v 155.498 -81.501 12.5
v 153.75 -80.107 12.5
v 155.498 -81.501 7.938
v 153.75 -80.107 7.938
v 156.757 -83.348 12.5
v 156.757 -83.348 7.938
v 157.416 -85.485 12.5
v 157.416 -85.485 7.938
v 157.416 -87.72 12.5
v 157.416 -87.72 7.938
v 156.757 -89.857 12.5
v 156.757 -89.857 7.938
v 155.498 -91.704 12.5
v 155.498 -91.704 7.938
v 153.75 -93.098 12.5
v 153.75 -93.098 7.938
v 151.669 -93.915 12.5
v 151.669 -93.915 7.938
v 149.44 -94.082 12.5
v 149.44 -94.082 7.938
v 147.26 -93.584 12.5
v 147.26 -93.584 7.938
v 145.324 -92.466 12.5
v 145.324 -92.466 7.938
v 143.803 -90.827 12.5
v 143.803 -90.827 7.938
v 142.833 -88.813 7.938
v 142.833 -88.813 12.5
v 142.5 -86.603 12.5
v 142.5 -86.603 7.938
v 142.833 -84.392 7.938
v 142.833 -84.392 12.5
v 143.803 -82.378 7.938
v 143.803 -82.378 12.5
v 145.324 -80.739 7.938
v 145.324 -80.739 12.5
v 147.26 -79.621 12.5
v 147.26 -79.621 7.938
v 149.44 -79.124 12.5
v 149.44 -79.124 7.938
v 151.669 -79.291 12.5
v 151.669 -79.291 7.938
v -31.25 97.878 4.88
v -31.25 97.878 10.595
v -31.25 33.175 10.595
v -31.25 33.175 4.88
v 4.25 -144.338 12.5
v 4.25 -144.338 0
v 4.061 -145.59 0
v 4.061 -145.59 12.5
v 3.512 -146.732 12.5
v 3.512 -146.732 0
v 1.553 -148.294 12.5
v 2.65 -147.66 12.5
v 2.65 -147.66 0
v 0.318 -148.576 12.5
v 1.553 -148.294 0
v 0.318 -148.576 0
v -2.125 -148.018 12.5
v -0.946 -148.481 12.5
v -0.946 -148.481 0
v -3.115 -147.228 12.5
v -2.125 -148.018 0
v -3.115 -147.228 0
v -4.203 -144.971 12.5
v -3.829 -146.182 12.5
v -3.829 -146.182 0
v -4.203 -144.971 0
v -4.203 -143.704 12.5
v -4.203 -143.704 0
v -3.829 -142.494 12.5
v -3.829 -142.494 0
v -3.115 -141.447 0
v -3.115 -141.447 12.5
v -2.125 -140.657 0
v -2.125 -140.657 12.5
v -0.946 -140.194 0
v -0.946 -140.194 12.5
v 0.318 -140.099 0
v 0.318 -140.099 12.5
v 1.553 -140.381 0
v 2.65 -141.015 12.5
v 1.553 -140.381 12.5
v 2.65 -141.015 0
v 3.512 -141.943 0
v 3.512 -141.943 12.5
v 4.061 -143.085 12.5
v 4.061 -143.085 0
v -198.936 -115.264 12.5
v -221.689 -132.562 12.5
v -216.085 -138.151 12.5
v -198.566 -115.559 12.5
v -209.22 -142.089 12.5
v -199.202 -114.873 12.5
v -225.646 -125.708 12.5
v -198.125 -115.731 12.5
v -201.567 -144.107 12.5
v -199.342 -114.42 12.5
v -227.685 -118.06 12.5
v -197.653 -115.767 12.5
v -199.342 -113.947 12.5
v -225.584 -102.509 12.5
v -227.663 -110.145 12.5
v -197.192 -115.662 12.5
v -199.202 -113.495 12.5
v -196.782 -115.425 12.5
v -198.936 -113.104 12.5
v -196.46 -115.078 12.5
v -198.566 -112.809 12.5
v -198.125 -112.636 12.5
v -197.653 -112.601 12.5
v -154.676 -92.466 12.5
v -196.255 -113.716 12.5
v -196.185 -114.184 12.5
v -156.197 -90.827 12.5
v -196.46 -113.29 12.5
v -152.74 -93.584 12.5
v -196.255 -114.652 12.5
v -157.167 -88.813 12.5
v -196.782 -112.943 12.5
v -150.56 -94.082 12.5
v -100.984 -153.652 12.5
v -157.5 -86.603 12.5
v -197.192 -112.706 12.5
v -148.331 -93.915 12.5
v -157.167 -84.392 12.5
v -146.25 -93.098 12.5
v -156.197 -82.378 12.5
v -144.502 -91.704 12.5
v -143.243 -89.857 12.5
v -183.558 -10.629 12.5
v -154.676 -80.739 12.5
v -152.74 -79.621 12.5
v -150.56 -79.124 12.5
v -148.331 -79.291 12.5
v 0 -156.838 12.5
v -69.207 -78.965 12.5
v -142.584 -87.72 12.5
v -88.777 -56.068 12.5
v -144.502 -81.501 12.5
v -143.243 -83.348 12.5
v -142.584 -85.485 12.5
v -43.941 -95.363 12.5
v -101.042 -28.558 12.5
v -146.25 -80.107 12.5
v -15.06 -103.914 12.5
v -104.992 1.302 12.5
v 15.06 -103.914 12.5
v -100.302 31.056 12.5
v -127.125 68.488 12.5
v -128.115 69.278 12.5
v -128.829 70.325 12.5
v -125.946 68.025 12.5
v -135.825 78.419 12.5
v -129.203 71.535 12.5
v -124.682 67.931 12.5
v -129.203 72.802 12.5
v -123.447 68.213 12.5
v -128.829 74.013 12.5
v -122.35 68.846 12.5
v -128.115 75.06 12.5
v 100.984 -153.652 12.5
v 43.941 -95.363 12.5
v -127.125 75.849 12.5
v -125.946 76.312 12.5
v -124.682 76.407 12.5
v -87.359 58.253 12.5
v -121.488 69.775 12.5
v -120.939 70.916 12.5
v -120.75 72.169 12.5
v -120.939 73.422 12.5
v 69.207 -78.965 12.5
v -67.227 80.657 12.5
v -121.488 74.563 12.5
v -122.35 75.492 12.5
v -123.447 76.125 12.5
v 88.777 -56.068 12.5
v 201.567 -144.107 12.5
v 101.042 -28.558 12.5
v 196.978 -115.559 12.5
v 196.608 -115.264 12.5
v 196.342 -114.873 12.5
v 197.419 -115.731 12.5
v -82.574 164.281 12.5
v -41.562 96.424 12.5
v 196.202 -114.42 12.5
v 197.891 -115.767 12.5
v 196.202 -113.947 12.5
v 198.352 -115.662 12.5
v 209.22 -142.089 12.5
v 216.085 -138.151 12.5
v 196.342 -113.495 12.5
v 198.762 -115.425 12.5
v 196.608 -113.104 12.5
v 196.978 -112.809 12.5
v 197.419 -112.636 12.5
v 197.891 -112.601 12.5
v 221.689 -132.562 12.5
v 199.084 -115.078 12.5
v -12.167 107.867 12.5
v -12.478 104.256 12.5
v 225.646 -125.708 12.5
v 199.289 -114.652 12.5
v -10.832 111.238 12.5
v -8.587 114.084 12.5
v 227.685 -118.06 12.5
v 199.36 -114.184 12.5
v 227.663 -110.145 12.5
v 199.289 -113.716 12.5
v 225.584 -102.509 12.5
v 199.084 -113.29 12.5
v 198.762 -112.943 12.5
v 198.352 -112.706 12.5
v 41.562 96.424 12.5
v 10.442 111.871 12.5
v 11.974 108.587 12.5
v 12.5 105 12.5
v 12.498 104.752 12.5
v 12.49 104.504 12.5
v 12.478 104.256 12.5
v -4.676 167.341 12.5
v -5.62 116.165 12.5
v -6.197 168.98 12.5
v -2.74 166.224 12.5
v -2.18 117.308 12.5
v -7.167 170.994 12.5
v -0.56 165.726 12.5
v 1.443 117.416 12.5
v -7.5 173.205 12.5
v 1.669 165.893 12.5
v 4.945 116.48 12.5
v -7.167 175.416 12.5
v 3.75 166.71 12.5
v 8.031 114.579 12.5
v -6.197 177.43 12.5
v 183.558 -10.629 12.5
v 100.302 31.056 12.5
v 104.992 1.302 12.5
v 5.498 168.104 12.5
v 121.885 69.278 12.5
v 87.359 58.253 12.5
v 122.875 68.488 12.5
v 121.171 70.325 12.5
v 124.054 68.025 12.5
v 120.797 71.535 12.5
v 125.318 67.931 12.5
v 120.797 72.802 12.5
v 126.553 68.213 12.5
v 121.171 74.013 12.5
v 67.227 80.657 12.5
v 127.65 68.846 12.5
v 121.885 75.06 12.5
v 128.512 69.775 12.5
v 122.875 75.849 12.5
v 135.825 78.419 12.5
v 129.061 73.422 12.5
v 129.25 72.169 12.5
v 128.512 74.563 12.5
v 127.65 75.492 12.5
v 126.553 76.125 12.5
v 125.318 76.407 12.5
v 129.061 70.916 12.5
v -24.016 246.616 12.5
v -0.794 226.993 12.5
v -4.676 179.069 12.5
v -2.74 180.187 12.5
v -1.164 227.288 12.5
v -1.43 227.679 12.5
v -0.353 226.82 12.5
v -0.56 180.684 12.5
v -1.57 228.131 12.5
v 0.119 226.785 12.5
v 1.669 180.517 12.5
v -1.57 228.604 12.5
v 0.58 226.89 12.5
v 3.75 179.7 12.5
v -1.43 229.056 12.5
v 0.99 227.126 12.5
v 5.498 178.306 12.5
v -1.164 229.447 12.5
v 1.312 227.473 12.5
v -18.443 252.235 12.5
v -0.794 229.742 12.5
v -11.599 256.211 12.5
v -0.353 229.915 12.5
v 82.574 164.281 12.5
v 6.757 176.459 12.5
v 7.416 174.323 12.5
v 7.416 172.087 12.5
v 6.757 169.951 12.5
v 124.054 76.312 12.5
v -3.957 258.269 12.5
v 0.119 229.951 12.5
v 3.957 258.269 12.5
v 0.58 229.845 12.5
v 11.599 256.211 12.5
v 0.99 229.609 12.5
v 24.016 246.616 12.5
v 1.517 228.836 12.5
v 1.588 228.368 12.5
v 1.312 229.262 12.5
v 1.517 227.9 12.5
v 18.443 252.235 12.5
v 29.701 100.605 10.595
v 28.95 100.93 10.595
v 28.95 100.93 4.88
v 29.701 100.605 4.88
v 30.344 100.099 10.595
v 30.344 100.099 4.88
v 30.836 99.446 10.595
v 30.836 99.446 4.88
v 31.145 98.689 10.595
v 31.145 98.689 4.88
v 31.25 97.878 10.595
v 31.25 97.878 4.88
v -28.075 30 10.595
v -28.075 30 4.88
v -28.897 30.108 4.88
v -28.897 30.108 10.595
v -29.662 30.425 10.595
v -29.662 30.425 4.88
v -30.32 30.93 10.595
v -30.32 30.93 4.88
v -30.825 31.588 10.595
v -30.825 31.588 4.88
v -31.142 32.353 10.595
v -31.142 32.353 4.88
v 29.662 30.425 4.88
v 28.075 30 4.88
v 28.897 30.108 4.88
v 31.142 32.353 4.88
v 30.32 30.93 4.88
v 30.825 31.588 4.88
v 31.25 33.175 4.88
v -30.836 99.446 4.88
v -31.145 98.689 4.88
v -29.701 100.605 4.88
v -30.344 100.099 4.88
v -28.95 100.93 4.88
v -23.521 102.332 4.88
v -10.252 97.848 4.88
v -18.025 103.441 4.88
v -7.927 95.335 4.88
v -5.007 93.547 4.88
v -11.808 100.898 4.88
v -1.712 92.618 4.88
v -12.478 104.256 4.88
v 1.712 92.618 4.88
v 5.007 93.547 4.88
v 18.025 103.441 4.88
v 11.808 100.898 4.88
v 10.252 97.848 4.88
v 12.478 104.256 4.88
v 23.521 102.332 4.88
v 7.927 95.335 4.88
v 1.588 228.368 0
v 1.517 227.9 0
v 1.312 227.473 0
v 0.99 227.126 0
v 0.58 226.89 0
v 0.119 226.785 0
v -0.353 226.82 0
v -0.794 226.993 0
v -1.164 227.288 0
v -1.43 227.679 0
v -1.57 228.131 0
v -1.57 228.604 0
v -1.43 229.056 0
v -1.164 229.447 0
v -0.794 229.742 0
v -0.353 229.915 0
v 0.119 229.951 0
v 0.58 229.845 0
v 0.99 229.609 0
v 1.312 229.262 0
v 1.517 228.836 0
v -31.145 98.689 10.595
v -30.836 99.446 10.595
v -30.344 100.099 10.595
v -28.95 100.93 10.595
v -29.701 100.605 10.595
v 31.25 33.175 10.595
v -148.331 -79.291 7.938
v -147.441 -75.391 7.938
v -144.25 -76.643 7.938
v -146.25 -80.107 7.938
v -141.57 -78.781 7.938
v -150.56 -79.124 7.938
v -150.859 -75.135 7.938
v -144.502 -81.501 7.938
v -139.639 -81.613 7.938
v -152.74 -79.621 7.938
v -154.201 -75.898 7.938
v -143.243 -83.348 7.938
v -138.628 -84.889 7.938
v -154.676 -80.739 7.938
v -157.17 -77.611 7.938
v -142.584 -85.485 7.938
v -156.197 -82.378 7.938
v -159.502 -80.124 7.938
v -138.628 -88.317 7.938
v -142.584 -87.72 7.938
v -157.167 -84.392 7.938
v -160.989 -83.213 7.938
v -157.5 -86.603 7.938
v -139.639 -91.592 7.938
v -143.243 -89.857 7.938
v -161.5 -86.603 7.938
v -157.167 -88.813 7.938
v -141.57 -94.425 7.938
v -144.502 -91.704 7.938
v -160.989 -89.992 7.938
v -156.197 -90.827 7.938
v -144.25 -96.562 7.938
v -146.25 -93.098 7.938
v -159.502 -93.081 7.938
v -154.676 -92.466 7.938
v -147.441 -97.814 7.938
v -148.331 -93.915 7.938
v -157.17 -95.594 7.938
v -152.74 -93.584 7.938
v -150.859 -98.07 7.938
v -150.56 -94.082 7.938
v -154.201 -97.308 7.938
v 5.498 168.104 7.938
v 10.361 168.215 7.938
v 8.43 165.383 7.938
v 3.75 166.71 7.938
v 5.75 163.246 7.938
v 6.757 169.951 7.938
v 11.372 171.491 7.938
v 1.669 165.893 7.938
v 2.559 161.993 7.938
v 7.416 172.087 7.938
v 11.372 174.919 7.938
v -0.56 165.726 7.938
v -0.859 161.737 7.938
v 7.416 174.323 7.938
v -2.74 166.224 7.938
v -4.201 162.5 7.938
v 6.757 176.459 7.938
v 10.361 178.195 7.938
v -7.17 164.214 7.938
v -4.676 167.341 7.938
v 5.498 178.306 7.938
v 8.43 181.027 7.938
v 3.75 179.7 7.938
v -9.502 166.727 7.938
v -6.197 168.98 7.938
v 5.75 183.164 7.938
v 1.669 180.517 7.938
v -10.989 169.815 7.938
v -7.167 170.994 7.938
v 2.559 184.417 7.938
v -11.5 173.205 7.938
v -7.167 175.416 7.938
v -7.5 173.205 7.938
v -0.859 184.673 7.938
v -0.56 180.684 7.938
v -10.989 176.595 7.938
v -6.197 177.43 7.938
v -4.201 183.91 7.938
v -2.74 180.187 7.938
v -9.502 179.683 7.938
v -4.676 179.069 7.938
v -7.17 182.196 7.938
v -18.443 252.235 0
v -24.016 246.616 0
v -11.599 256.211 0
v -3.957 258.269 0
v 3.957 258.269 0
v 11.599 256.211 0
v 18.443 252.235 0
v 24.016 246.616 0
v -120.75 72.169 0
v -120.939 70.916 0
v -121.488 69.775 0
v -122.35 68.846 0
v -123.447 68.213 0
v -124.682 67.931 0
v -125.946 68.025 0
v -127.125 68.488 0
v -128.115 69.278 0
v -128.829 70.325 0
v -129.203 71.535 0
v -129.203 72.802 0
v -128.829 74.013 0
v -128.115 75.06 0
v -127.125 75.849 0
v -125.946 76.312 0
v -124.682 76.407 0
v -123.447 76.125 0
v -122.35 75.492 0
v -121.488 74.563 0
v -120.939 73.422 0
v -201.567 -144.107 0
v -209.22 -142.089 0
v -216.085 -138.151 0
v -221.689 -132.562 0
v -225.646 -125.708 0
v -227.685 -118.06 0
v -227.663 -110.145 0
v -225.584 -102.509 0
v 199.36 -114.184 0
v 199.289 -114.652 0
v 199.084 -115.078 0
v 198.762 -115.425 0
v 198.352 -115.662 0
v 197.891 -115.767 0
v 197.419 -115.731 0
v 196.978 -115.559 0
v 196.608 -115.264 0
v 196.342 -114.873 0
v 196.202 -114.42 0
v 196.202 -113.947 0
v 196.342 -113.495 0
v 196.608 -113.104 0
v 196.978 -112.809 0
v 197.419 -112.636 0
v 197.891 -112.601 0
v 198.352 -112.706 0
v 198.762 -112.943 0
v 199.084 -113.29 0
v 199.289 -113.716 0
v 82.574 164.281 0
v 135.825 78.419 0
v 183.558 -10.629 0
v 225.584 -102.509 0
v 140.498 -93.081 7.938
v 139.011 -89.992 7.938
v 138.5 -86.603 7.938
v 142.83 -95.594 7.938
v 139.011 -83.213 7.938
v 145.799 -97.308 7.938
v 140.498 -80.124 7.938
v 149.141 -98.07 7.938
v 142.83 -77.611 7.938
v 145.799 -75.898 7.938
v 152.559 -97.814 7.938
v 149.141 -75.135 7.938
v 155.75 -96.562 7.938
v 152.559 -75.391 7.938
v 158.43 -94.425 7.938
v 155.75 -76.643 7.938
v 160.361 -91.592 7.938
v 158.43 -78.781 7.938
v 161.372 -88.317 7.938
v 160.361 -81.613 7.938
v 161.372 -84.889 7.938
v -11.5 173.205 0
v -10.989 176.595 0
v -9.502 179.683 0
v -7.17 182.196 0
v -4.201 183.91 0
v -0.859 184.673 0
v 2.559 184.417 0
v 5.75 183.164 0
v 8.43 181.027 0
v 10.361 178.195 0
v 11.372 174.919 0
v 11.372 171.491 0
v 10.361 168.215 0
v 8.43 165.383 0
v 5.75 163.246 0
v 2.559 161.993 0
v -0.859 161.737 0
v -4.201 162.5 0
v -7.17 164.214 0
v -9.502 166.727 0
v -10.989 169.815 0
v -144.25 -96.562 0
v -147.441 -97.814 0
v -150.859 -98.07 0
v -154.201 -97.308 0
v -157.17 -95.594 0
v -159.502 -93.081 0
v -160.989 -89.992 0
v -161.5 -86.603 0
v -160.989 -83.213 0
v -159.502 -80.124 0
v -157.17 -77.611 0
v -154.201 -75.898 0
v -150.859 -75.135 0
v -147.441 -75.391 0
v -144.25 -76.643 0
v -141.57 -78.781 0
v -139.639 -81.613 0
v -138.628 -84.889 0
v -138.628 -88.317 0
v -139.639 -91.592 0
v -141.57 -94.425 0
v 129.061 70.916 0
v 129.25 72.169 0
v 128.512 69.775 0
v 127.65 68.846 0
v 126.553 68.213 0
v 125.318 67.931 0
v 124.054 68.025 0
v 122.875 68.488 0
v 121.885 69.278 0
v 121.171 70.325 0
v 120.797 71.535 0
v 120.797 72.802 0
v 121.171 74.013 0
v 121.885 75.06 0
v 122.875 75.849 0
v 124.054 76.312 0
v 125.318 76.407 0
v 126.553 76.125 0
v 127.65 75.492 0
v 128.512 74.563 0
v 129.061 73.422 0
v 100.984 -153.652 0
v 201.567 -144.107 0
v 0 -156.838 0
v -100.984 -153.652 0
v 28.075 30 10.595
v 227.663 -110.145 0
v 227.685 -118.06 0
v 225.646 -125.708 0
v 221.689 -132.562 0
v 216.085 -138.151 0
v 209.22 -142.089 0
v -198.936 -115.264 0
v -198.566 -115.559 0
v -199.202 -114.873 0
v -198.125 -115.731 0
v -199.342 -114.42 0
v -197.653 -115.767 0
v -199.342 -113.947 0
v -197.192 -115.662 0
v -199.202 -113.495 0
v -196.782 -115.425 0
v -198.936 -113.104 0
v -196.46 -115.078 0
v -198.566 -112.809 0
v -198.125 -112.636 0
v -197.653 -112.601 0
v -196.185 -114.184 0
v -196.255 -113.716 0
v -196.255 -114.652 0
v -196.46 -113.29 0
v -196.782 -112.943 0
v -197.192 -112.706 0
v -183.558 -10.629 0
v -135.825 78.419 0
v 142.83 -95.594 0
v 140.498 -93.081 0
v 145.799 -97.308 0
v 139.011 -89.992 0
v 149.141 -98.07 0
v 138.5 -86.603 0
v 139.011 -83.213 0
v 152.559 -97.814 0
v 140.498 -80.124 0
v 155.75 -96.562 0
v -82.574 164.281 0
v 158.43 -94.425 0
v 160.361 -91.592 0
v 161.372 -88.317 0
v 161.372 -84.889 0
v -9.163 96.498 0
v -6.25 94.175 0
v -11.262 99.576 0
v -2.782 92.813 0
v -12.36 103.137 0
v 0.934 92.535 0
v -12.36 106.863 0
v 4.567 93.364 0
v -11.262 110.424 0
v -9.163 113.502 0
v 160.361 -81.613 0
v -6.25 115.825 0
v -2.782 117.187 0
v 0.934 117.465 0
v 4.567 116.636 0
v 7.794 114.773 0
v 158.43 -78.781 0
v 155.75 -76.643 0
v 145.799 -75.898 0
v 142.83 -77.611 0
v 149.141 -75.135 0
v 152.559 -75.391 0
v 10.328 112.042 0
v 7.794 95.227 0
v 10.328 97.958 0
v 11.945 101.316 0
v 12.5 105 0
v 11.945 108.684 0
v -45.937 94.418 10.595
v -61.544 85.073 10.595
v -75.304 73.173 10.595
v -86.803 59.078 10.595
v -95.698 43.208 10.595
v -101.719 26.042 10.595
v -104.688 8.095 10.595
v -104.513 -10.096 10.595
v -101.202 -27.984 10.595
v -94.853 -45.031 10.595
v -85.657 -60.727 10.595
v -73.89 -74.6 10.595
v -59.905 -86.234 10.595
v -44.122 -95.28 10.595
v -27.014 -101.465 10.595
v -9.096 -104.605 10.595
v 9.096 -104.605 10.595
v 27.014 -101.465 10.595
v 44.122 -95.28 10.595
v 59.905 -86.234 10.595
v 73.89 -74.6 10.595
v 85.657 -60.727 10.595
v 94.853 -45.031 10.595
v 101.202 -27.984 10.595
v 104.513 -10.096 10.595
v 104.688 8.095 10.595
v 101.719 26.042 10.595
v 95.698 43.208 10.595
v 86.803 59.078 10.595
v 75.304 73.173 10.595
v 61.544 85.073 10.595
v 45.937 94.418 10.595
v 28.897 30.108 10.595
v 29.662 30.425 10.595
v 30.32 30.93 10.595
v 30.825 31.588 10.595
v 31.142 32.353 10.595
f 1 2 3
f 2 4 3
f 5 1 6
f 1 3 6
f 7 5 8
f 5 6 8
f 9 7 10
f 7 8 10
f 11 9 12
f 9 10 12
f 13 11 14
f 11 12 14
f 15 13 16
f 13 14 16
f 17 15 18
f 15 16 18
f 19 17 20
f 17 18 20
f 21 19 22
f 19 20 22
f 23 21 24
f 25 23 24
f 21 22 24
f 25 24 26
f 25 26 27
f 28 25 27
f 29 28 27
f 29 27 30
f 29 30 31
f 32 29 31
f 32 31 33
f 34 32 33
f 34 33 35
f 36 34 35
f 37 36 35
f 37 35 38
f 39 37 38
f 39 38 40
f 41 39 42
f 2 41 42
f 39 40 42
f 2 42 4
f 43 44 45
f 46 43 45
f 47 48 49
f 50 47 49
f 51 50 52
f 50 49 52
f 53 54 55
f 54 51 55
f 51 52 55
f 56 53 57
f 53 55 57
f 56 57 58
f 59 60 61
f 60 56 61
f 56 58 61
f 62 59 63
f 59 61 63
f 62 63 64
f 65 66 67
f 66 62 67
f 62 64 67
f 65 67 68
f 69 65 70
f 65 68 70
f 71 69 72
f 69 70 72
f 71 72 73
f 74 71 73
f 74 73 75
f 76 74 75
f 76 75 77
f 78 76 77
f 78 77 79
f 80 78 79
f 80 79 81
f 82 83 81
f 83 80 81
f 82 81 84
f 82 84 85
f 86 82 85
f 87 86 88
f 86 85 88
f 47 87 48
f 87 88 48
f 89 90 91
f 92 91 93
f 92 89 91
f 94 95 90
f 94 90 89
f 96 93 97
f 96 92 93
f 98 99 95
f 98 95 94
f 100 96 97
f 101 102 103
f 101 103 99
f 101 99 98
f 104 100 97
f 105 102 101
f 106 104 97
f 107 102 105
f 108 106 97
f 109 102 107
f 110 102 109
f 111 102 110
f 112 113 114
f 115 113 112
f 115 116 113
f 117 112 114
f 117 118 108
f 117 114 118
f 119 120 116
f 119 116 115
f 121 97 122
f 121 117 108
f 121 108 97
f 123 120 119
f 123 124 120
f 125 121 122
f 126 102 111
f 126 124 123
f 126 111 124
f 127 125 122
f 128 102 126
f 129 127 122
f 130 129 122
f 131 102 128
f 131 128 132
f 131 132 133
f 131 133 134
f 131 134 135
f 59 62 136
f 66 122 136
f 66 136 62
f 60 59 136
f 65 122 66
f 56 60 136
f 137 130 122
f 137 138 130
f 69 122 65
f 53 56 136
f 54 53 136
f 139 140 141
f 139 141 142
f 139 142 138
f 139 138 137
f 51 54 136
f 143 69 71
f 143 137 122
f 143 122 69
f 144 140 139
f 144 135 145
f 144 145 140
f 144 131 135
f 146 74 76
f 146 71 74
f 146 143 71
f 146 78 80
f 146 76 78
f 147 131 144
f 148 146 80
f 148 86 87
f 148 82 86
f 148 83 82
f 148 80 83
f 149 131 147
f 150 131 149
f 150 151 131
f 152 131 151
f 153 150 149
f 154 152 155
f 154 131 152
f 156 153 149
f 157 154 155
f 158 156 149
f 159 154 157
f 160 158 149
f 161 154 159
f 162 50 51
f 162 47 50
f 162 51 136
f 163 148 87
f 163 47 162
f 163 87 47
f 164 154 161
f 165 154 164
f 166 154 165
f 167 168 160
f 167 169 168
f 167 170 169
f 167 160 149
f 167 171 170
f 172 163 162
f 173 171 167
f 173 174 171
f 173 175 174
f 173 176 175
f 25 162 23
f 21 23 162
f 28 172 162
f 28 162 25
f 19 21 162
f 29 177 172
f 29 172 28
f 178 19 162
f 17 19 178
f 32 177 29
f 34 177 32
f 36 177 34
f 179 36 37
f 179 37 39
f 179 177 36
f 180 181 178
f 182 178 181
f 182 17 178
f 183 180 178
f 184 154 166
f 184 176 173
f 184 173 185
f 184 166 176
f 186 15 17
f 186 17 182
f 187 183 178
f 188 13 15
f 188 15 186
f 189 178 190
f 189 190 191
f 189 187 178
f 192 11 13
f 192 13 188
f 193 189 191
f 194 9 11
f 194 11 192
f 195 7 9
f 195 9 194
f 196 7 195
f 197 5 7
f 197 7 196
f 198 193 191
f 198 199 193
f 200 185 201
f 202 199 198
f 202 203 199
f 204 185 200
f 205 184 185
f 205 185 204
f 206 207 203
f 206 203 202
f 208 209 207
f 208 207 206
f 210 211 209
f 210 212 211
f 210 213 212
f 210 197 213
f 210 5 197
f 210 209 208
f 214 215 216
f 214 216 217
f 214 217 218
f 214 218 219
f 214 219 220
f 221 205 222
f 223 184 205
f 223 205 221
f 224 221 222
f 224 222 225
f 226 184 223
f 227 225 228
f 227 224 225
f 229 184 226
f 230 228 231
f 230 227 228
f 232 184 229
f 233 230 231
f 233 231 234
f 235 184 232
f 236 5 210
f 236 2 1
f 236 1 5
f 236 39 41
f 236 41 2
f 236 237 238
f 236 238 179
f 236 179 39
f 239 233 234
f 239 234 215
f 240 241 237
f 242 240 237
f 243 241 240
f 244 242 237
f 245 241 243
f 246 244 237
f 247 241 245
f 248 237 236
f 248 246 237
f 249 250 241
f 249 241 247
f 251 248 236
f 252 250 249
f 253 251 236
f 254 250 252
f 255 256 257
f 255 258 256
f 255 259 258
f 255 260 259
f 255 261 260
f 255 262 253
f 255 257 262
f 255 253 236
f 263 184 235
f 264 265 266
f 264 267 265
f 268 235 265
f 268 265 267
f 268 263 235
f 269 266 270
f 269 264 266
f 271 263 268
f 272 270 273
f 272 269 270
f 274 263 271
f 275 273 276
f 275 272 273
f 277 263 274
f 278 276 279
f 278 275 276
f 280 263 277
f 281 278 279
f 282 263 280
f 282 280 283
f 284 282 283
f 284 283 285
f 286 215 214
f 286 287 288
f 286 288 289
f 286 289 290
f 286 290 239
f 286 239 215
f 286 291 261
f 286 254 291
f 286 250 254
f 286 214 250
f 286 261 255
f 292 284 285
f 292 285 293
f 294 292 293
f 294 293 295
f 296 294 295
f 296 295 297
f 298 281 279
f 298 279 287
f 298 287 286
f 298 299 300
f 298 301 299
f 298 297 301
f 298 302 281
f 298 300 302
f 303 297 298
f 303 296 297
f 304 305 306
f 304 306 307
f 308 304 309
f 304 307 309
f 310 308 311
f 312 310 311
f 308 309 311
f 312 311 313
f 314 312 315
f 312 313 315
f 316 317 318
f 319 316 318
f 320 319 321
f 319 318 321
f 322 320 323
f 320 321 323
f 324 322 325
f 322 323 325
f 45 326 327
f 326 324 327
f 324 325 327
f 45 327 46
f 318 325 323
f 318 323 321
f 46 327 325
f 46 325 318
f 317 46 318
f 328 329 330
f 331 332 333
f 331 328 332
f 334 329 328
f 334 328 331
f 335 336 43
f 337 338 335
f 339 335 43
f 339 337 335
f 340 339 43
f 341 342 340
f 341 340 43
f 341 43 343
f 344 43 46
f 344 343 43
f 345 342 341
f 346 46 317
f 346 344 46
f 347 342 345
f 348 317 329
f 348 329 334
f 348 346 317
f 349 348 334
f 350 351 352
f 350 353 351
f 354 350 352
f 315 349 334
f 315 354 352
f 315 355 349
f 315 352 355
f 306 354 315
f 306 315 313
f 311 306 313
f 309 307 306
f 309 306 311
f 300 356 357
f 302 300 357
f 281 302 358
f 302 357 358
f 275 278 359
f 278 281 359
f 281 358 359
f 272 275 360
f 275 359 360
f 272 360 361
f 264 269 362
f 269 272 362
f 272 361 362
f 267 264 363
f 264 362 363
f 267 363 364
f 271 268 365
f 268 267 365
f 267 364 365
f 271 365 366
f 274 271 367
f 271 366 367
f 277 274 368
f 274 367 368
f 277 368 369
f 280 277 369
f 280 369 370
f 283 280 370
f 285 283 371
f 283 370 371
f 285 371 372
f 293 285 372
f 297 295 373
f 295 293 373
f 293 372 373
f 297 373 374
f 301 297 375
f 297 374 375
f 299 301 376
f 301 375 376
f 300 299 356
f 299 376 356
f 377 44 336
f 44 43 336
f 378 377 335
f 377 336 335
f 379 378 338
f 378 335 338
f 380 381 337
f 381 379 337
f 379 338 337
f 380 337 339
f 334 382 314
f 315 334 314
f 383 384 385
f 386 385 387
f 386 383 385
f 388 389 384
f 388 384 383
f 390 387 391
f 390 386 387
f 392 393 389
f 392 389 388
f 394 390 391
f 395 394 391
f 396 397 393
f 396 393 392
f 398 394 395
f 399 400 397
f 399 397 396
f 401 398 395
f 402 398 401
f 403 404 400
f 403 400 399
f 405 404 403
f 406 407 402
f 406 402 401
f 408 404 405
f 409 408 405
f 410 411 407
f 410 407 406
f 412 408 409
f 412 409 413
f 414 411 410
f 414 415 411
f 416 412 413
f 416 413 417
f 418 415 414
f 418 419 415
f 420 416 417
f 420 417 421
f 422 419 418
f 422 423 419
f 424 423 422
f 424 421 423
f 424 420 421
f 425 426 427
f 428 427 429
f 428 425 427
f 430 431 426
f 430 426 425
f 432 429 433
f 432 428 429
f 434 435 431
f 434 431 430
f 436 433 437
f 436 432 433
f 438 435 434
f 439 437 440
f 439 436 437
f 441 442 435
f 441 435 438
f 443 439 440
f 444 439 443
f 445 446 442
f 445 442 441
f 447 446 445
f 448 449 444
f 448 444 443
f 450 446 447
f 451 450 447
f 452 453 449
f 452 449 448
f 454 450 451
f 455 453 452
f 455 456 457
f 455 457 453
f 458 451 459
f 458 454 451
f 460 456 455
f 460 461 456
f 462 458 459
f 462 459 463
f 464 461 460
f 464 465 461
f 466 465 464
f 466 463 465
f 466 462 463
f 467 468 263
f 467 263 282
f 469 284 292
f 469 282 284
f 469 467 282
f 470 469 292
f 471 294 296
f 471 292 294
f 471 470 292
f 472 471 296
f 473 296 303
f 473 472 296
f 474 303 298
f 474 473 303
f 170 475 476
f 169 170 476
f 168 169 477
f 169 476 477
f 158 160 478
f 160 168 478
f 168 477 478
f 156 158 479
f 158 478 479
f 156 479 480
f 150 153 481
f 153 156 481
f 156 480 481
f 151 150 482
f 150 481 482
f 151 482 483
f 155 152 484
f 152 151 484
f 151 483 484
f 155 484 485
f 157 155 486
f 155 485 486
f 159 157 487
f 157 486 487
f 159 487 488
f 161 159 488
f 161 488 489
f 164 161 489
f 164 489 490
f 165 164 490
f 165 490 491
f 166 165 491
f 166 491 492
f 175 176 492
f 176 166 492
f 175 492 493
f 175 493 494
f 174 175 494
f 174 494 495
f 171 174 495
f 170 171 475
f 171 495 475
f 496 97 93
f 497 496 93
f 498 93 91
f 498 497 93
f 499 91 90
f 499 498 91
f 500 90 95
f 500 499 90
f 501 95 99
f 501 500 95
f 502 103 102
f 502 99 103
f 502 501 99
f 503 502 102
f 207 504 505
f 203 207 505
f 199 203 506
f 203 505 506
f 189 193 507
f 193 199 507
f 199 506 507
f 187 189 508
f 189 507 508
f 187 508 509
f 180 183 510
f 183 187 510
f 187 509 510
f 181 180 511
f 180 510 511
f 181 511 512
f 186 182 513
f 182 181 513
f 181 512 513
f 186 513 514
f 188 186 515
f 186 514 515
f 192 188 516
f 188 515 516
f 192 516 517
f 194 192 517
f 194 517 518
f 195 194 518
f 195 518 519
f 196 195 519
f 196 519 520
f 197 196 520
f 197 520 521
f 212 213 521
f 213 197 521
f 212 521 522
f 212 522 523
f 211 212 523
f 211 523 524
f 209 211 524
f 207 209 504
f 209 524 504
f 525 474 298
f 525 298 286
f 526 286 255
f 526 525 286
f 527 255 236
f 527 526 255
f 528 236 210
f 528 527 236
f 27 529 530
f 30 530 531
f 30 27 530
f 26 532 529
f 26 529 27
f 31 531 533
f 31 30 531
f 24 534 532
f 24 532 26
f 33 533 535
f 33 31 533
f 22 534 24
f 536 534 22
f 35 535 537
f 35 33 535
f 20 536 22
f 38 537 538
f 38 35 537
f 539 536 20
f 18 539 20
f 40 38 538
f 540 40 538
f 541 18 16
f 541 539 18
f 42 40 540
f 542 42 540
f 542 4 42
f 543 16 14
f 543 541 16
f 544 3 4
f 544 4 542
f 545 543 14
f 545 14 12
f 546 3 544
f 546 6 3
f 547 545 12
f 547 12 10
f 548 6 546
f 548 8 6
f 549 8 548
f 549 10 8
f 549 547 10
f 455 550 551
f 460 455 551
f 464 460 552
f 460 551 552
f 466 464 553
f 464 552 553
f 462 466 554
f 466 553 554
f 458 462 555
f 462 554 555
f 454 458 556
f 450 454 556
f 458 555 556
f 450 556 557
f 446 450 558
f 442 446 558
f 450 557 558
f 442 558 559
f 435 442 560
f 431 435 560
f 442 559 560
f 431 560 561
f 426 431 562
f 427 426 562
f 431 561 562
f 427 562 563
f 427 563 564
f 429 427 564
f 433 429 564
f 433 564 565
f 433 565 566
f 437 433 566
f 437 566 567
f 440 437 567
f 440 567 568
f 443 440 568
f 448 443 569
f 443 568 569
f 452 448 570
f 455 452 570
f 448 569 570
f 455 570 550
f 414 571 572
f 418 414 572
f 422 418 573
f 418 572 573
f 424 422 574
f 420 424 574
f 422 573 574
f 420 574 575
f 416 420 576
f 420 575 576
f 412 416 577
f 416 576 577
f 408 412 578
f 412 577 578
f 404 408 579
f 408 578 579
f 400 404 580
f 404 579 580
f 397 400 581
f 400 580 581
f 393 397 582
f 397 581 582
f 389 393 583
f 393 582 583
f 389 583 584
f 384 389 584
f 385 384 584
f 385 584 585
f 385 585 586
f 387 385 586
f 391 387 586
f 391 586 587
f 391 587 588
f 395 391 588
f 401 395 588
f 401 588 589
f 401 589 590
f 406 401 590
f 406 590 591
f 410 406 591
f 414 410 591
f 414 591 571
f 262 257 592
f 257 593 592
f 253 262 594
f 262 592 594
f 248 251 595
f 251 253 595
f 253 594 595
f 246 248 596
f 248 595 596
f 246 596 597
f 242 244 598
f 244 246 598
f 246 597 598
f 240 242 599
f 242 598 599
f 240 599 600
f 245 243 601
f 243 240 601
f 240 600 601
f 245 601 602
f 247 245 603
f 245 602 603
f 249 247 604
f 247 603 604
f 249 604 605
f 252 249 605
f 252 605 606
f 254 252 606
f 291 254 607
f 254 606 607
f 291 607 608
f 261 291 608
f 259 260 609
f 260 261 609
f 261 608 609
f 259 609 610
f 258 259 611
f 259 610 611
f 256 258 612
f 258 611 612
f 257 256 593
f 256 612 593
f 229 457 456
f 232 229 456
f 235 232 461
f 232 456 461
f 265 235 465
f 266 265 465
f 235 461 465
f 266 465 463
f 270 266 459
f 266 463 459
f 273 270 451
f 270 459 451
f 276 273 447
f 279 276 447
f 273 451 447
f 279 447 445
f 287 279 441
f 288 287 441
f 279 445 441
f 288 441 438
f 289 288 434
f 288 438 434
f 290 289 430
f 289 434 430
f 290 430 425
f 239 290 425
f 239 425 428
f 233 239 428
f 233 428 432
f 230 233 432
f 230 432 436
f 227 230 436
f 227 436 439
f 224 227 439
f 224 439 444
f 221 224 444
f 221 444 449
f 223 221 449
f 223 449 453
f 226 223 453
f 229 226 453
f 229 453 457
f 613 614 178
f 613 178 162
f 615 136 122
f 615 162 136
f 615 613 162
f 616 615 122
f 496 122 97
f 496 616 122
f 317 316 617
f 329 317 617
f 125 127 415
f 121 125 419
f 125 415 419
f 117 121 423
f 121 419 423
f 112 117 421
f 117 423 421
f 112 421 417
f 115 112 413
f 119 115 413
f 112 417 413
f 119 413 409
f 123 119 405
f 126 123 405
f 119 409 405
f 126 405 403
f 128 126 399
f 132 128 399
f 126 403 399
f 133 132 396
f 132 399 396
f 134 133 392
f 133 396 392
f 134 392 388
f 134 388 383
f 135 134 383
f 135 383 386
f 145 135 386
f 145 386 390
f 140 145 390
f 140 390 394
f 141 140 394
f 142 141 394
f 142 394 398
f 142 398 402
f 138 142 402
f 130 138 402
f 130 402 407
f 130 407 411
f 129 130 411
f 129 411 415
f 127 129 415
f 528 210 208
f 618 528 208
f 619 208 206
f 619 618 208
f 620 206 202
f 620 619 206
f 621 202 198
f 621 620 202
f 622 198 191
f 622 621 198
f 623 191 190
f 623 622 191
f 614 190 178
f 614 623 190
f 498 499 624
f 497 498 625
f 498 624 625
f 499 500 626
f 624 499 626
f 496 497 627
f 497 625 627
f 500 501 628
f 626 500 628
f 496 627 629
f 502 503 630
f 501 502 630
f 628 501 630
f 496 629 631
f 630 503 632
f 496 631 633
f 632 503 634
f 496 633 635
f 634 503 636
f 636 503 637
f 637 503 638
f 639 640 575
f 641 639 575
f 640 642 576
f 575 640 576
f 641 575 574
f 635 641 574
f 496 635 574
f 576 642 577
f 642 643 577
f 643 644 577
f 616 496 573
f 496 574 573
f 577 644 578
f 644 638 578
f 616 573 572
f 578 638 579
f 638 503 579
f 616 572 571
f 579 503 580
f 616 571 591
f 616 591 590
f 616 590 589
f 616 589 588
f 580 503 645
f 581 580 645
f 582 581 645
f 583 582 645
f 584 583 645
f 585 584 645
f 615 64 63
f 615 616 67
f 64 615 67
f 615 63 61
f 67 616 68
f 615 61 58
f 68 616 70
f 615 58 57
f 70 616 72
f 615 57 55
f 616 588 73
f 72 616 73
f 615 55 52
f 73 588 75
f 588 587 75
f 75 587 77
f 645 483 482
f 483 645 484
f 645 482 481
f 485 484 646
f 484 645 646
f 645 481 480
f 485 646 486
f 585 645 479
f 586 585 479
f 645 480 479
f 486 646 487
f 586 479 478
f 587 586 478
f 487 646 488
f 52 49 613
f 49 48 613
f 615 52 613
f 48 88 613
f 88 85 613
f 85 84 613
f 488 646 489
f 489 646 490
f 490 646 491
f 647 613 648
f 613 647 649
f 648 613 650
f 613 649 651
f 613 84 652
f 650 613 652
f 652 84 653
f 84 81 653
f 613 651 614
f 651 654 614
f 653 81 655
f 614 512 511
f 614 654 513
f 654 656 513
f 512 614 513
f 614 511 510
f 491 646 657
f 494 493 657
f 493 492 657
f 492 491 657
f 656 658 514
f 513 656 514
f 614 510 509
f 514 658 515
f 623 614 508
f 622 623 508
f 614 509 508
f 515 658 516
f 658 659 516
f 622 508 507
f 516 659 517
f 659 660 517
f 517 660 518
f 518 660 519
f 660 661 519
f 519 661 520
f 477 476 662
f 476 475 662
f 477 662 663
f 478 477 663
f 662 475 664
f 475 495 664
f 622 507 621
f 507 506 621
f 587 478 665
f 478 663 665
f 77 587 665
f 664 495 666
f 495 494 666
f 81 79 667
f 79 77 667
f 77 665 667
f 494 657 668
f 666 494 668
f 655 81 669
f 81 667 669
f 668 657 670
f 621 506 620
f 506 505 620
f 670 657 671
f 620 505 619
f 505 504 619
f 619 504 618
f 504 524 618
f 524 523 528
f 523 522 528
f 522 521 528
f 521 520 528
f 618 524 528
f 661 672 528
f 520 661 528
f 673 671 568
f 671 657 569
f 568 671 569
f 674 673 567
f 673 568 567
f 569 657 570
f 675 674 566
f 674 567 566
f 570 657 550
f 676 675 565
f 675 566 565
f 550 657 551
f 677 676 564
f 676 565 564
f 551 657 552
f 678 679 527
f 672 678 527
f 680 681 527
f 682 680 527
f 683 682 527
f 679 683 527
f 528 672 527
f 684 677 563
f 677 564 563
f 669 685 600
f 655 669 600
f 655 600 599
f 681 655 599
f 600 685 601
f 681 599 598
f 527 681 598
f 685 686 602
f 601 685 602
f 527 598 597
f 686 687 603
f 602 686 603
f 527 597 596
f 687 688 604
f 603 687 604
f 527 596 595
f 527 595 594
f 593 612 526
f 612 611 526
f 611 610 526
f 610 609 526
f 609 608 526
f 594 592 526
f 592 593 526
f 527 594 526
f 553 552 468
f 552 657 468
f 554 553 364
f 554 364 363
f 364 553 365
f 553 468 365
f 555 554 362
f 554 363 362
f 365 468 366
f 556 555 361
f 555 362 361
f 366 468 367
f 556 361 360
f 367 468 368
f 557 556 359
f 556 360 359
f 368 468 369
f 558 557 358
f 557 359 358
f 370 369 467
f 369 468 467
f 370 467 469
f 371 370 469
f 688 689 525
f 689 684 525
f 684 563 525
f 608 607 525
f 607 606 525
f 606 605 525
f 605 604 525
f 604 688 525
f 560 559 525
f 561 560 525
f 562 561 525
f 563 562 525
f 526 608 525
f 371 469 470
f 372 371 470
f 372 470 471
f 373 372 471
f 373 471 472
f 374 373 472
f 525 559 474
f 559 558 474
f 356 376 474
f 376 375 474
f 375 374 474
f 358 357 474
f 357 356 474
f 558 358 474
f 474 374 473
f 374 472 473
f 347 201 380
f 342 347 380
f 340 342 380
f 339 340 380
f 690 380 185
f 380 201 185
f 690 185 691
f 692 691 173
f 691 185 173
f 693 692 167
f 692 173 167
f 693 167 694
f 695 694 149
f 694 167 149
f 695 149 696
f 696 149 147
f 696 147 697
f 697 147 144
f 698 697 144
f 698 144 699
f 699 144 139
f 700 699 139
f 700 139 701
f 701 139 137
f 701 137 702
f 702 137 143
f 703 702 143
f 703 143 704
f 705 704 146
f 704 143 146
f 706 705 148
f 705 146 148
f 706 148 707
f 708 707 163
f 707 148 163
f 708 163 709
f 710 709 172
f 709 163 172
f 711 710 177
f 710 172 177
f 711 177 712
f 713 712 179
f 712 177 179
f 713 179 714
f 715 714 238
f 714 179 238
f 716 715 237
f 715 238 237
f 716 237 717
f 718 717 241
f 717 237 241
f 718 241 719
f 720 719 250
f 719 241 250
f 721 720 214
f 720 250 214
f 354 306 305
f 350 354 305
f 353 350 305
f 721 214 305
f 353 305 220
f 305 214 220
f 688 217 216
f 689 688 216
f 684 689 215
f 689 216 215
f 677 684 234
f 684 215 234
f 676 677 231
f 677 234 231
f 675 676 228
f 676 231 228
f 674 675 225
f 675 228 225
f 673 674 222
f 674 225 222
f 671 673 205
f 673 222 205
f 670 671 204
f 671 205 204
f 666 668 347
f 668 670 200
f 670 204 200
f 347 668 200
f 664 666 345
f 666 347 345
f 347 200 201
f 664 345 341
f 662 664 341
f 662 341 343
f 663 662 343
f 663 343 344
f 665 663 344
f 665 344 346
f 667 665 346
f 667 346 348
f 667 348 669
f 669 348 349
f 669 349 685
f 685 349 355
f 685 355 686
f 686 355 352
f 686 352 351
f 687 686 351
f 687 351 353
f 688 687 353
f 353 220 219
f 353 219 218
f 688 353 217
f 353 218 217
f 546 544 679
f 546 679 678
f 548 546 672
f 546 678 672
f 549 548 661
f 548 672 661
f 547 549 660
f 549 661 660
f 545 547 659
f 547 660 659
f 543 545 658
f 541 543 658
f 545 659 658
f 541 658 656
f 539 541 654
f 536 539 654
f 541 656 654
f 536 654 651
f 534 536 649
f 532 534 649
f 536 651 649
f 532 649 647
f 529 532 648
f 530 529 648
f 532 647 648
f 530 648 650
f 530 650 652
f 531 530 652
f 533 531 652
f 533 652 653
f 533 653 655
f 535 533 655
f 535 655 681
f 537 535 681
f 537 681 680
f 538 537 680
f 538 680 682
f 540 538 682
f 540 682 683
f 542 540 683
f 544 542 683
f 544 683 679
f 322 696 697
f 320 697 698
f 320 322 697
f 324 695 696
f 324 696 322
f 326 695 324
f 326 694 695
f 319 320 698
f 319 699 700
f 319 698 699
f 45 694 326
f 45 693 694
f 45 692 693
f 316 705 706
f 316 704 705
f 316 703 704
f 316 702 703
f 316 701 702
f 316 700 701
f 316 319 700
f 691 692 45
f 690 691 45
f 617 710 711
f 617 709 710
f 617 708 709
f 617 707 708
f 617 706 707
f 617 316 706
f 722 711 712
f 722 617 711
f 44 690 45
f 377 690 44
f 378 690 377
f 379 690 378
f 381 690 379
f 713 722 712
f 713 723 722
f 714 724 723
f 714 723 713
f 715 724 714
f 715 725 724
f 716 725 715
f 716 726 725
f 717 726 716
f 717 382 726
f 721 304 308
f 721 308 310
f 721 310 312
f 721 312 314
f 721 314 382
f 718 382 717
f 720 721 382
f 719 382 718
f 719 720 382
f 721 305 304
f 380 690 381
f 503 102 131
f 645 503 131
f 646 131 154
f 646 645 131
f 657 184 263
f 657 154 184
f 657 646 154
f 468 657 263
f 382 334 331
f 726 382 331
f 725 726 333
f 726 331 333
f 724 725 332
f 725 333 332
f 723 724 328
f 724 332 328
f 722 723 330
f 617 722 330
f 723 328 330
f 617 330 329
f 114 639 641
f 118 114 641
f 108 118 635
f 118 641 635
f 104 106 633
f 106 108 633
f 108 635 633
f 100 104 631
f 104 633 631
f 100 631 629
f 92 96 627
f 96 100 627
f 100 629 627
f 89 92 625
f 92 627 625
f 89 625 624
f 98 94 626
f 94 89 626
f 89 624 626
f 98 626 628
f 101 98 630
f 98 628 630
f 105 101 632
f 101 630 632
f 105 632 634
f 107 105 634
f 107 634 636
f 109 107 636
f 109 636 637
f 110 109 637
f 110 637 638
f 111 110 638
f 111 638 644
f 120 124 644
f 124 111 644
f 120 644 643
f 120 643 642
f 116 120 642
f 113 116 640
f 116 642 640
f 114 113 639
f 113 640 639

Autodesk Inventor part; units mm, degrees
ref_plane "YZ Plane" through (0, 0, 0) normal (1, 0, 0) x (0, 1, 0)
ref_plane "XZ Plane" through (0, 0, 0) normal (0, 1, 0) x (-1, 0, 0)
ref_plane "XY Plane" through (0, 0, 0) normal (0, 0, 1) x (1, 0, 0)
sketch "Sketch1" plane through (0, 0, 0) normal (0, 0, 1) x (1, 0, 0)
  line L0 (0, -144.3376) -> (-125, 72.1688) construction
  line L1 (-125, 72.1688) -> (125, 72.1688) construction
  line L2 (125, 72.1688) -> (0, -144.3376) construction
  line L3 (0, 173.2051) -> (150, -86.6025) construction
  line L4 (150, -86.6025) -> (-150, -86.6025) construction
  line L5 (-150, -86.6025) -> (0, 173.2051) construction
  circle A0 centre (-150, -86.6025) radius 1.5875
  circle A1 centre (150, -86.6025) radius 1.5875
  circle A2 centre (0, 173.2051) radius 1.5875
  circle A3 centre (-125, 72.1688) radius 4.25
  circle A4 centre (125, 72.1688) radius 4.25
  circle A5 centre (0, -144.3376) radius 4.25
  circle A6 centre (-150, -86.6025) radius 25 construction
  line L6 (-250.0151, -144.3463) -> (0, 288.6926) construction
  line L7 (0, 288.6926) -> (250.0151, -144.3463) construction
  line L8 (250.0151, -144.3463) -> (-250.0151, -144.3463) construction
  arc A7 (-225.5835, -102.5089) -> (-201.5671, -144.1066) centre (-197.7721, -114.1838) ccw
  circle A8 centre (-125, 72.1688) radius 12.5 construction
  arc A9 (24.0164, 246.6155) -> (-24.0164, 246.6155) centre (0, 228.3676) ccw
  arc A10 (201.5671, -144.1066) -> (225.5835, -102.5089) centre (197.7721, -114.1838) ccw
  arc A11 (-24.0164, 246.6155) -> (-225.5835, -102.5089) centre (1251.5935, -722.6079) ccw
  arc A12 (225.5835, -102.5089) -> (24.0164, 246.6155) centre (-1251.5935, -722.6079) ccw
  arc A13 (-201.5671, -144.1066) -> (201.5671, -144.1066) centre (0, 1445.2157) ccw
  circle A14 centre (0, 228.3676) radius 1.5875
  circle A15 centre (-197.7721, -114.1838) radius 1.5875
  circle A16 centre (197.7721, -114.1838) radius 1.5875
  point P0 (0, 0)
  point P1 (0, 0)
  point P2 (0, 0)
  point P3 (0, 0)
  dimension "d0" = 300
  dimension "d1" = 250
  dimension "d2" = 3.175
  dimension "d3" = 8.5
  dimension "d4" = 50
  dimension "d5" = 60.325
  dimension "d6" = 25
  dimension "d9" = 3.175
extrude "Extrusion2" add sketch "Sketch1" along normal blind 12.5
sketch "Sketch2" plane through (0, 0, 12.5) normal (0, 0, 1) x (1, 0, 0)
  circle A0 centre (0, 0) radius 105
  dimension "d12" = 210
extrude "Extrusion3" cut sketch "Sketch2" against normal blind 1.905
sketch "Sketch3" plane through (0, 0, 10.595) normal (0, 0, 1) x (1, 0, 0)
  circle A0 centre (0, 0) radius 105 projected
  line L0 (-31.25, 100.2419) -> (-31.25, 30)
  line L1 (-31.25, 30) -> (31.25, 30)
  line L2 (31.25, 30) -> (31.25, 100.2419)
  line L3 (0, 30) -> (0, 105) construction
  dimension "d16" = 75
  dimension "d18" = 62.5
extrude "Extrusion4" cut sketch "Sketch3" against normal blind 5.715 contours L2 L1 L0 A0 picked at (2.1141, 54.9361)
sketch "Sketch4" plane through (0, 0, 12.5) normal (0, 0, 1) x (1, 0, 0)
  circle A0 centre (0, 0) radius 105 projected
  circle A1 centre (0, 105) radius 12.5
  dimension "d21" = 25
extrude "Extrusion5" cut sketch "Sketch4" against normal through all contours A1 A0 | A0 A1 picked at (-0.4833, 100.8063) picked at (0.3884, 109.0934)
fillet "Fillet1" radius 3.175 4 edges at (-31.25, 100.2419, 7.7375) (31.25, 100.2419, 7.7375) (31.25, 30, 7.7375) (-31.25, 30, 7.7375)
sketch "Sketch8" plane through (0, 0, 0) normal (0, 0, -1) x (-1, 0, 0)
  circle A0 centre (0, 173.2051) radius 1.5875 projected
  circle A1 centre (0, 173.2051) radius 11.5
  point P0 (0, 0)
  dimension "d34" = 23
extrude "Extrusion9" cut sketch "Sketch8" against normal blind 7.9375
sketch "Sketch9" plane through (0, 173.2051, 7.9375) normal (0, 0, -1) x (-1, 0, 0)
  circle A0 centre (0, 0) radius 1.5875 projected
  circle A1 centre (0, 0) radius 11.5 projected
  circle A2 centre (0, 0) radius 7.5
  point P0 (0, -173.2051)
  dimension "d38" = 15
extrude "Extrusion10" cut sketch "Sketch9" against normal through all contours A2
pattern_circular "Circular Pattern1" count 3 over 360 about axis through (0, 0, 12.5) along (0, 0, -1) of "Extrusion10", "Extrusion9"
sketch "Sketch5" plane through (0, 0, 12.5) normal (0, 0, 1) x (1, 0, 0)
  arc A0 (24.0164, 246.6155) -> (-24.0164, 246.6155) centre (0, 228.3676) ccw projected
  arc A1 (201.5671, -144.1066) -> (225.5835, -102.5089) centre (197.7721, -114.1838) ccw projected
  circle A2 centre (0, 228.3676) radius 1.5875 projected
  circle A3 centre (-197.7721, -114.1838) radius 1.5875 projected
  circle A4 centre (197.7721, -114.1838) radius 1.5875 projected
  circle A5 centre (0, 228.3676) radius 30.1625
  circle A6 centre (197.7721, -114.1838) radius 30.1625
  circle A7 centre (-197.7721, -114.1838) radius 30.1625
sketch "Sketch6" plane through (-193.442, -111.6838, 571.3) normal (0, 0, 1) x (1, 0, 0)
  circle A0 centre (0, 0) radius 1.5875 projected
  circle A1 centre (0, 0) radius 30.1625 projected
  arc A2 (205.9198, 215.9397) -> (180.9642, 215.9397) centre (193.442, 216.6838) ccw projected
  arc A3 (180.9642, 215.9397) -> (205.9198, 215.9397) centre (193.442, 111.6838) ccw projected
  circle A4 centre (193.442, -32.6538) radius 4.25 projected
  circle A5 centre (318.442, 183.8526) radius 4.25 projected
  circle A6 centre (68.442, 183.8526) radius 4.25 projected
  circle A7 centre (193.442, 284.8889) radius 1.5875 projected
  circle A8 centre (343.442, 25.0812) radius 1.5875 projected
  circle A9 centre (43.442, 25.0812) radius 1.5875 projected
  arc A10 (-4.6471, -29.8024) -> (-28.1332, 10.8766) centre (0, 0) ccw projected
  arc A11 (-4.6471, -29.8024) -> (391.5311, -29.8024) centre (193.442, 1240.5571) ccw projected
  arc A12 (415.0172, 10.8766) -> (391.5311, -29.8024) centre (386.884, 0) ccw projected
  arc A13 (415.0172, 10.8766) -> (216.928, 353.9771) centre (-784.1909, -452.7528) ccw projected
  arc A14 (169.956, 353.9771) -> (216.928, 353.9771) centre (193.442, 335.0514) ccw projected
  arc A15 (169.956, 353.9771) -> (-28.1332, 10.8766) centre (1171.0749, -452.7528) ccw projected
  circle A16 centre (193.442, 335.0514) radius 1.5875 projected
  circle A17 centre (193.442, 335.0514) radius 30.1625 projected
  circle A18 centre (386.884, 0) radius 1.5875 projected
  circle A19 centre (386.884, 0) radius 30.1625 projected
sketch "Sketch7" plane through (-193.442, -111.6838, -89.1) normal (0, 0, -1) x (-1, 0, 0)
  circle A0 centre (0, 0) radius 30.1625 projected
  circle A1 centre (-68.442, 183.8526) radius 4.25 projected
  circle A2 centre (-318.442, 183.8526) radius 4.25 projected
  circle A3 centre (-193.442, -32.6538) radius 4.25 projected
  circle A4 centre (-43.442, 25.0812) radius 1.5875 projected
  circle A5 centre (-343.442, 25.0812) radius 1.5875 projected
  circle A6 centre (-193.442, 284.8889) radius 1.5875 projected
  circle A7 centre (-386.884, 0) radius 1.5875 projected
  circle A8 centre (-193.442, 335.0514) radius 1.5875 projected
  circle A9 centre (0, 0) radius 1.5875 projected
  arc A10 (-169.956, 353.9771) -> (-216.928, 353.9771) centre (-193.442, 335.0514) ccw projected
  arc A11 (28.1332, 10.8766) -> (-169.956, 353.9771) centre (-1171.0749, -452.7528) ccw projected
  arc A12 (-391.5311, -29.8024) -> (4.6471, -29.8024) centre (-193.442, 1240.5571) ccw projected
  arc A13 (-415.0172, 10.8766) -> (-391.5311, -29.8024) centre (-386.884, 0) ccw projected
  arc A14 (-216.928, 353.9771) -> (-415.0172, 10.8766) centre (784.1909, -452.7528) ccw projected
  arc A15 (4.6471, -29.8024) -> (28.1332, 10.8766) centre (0, 0) ccw projected
  point P0 (-193.442, 111.6838)
properties part number "MID PLATE"
